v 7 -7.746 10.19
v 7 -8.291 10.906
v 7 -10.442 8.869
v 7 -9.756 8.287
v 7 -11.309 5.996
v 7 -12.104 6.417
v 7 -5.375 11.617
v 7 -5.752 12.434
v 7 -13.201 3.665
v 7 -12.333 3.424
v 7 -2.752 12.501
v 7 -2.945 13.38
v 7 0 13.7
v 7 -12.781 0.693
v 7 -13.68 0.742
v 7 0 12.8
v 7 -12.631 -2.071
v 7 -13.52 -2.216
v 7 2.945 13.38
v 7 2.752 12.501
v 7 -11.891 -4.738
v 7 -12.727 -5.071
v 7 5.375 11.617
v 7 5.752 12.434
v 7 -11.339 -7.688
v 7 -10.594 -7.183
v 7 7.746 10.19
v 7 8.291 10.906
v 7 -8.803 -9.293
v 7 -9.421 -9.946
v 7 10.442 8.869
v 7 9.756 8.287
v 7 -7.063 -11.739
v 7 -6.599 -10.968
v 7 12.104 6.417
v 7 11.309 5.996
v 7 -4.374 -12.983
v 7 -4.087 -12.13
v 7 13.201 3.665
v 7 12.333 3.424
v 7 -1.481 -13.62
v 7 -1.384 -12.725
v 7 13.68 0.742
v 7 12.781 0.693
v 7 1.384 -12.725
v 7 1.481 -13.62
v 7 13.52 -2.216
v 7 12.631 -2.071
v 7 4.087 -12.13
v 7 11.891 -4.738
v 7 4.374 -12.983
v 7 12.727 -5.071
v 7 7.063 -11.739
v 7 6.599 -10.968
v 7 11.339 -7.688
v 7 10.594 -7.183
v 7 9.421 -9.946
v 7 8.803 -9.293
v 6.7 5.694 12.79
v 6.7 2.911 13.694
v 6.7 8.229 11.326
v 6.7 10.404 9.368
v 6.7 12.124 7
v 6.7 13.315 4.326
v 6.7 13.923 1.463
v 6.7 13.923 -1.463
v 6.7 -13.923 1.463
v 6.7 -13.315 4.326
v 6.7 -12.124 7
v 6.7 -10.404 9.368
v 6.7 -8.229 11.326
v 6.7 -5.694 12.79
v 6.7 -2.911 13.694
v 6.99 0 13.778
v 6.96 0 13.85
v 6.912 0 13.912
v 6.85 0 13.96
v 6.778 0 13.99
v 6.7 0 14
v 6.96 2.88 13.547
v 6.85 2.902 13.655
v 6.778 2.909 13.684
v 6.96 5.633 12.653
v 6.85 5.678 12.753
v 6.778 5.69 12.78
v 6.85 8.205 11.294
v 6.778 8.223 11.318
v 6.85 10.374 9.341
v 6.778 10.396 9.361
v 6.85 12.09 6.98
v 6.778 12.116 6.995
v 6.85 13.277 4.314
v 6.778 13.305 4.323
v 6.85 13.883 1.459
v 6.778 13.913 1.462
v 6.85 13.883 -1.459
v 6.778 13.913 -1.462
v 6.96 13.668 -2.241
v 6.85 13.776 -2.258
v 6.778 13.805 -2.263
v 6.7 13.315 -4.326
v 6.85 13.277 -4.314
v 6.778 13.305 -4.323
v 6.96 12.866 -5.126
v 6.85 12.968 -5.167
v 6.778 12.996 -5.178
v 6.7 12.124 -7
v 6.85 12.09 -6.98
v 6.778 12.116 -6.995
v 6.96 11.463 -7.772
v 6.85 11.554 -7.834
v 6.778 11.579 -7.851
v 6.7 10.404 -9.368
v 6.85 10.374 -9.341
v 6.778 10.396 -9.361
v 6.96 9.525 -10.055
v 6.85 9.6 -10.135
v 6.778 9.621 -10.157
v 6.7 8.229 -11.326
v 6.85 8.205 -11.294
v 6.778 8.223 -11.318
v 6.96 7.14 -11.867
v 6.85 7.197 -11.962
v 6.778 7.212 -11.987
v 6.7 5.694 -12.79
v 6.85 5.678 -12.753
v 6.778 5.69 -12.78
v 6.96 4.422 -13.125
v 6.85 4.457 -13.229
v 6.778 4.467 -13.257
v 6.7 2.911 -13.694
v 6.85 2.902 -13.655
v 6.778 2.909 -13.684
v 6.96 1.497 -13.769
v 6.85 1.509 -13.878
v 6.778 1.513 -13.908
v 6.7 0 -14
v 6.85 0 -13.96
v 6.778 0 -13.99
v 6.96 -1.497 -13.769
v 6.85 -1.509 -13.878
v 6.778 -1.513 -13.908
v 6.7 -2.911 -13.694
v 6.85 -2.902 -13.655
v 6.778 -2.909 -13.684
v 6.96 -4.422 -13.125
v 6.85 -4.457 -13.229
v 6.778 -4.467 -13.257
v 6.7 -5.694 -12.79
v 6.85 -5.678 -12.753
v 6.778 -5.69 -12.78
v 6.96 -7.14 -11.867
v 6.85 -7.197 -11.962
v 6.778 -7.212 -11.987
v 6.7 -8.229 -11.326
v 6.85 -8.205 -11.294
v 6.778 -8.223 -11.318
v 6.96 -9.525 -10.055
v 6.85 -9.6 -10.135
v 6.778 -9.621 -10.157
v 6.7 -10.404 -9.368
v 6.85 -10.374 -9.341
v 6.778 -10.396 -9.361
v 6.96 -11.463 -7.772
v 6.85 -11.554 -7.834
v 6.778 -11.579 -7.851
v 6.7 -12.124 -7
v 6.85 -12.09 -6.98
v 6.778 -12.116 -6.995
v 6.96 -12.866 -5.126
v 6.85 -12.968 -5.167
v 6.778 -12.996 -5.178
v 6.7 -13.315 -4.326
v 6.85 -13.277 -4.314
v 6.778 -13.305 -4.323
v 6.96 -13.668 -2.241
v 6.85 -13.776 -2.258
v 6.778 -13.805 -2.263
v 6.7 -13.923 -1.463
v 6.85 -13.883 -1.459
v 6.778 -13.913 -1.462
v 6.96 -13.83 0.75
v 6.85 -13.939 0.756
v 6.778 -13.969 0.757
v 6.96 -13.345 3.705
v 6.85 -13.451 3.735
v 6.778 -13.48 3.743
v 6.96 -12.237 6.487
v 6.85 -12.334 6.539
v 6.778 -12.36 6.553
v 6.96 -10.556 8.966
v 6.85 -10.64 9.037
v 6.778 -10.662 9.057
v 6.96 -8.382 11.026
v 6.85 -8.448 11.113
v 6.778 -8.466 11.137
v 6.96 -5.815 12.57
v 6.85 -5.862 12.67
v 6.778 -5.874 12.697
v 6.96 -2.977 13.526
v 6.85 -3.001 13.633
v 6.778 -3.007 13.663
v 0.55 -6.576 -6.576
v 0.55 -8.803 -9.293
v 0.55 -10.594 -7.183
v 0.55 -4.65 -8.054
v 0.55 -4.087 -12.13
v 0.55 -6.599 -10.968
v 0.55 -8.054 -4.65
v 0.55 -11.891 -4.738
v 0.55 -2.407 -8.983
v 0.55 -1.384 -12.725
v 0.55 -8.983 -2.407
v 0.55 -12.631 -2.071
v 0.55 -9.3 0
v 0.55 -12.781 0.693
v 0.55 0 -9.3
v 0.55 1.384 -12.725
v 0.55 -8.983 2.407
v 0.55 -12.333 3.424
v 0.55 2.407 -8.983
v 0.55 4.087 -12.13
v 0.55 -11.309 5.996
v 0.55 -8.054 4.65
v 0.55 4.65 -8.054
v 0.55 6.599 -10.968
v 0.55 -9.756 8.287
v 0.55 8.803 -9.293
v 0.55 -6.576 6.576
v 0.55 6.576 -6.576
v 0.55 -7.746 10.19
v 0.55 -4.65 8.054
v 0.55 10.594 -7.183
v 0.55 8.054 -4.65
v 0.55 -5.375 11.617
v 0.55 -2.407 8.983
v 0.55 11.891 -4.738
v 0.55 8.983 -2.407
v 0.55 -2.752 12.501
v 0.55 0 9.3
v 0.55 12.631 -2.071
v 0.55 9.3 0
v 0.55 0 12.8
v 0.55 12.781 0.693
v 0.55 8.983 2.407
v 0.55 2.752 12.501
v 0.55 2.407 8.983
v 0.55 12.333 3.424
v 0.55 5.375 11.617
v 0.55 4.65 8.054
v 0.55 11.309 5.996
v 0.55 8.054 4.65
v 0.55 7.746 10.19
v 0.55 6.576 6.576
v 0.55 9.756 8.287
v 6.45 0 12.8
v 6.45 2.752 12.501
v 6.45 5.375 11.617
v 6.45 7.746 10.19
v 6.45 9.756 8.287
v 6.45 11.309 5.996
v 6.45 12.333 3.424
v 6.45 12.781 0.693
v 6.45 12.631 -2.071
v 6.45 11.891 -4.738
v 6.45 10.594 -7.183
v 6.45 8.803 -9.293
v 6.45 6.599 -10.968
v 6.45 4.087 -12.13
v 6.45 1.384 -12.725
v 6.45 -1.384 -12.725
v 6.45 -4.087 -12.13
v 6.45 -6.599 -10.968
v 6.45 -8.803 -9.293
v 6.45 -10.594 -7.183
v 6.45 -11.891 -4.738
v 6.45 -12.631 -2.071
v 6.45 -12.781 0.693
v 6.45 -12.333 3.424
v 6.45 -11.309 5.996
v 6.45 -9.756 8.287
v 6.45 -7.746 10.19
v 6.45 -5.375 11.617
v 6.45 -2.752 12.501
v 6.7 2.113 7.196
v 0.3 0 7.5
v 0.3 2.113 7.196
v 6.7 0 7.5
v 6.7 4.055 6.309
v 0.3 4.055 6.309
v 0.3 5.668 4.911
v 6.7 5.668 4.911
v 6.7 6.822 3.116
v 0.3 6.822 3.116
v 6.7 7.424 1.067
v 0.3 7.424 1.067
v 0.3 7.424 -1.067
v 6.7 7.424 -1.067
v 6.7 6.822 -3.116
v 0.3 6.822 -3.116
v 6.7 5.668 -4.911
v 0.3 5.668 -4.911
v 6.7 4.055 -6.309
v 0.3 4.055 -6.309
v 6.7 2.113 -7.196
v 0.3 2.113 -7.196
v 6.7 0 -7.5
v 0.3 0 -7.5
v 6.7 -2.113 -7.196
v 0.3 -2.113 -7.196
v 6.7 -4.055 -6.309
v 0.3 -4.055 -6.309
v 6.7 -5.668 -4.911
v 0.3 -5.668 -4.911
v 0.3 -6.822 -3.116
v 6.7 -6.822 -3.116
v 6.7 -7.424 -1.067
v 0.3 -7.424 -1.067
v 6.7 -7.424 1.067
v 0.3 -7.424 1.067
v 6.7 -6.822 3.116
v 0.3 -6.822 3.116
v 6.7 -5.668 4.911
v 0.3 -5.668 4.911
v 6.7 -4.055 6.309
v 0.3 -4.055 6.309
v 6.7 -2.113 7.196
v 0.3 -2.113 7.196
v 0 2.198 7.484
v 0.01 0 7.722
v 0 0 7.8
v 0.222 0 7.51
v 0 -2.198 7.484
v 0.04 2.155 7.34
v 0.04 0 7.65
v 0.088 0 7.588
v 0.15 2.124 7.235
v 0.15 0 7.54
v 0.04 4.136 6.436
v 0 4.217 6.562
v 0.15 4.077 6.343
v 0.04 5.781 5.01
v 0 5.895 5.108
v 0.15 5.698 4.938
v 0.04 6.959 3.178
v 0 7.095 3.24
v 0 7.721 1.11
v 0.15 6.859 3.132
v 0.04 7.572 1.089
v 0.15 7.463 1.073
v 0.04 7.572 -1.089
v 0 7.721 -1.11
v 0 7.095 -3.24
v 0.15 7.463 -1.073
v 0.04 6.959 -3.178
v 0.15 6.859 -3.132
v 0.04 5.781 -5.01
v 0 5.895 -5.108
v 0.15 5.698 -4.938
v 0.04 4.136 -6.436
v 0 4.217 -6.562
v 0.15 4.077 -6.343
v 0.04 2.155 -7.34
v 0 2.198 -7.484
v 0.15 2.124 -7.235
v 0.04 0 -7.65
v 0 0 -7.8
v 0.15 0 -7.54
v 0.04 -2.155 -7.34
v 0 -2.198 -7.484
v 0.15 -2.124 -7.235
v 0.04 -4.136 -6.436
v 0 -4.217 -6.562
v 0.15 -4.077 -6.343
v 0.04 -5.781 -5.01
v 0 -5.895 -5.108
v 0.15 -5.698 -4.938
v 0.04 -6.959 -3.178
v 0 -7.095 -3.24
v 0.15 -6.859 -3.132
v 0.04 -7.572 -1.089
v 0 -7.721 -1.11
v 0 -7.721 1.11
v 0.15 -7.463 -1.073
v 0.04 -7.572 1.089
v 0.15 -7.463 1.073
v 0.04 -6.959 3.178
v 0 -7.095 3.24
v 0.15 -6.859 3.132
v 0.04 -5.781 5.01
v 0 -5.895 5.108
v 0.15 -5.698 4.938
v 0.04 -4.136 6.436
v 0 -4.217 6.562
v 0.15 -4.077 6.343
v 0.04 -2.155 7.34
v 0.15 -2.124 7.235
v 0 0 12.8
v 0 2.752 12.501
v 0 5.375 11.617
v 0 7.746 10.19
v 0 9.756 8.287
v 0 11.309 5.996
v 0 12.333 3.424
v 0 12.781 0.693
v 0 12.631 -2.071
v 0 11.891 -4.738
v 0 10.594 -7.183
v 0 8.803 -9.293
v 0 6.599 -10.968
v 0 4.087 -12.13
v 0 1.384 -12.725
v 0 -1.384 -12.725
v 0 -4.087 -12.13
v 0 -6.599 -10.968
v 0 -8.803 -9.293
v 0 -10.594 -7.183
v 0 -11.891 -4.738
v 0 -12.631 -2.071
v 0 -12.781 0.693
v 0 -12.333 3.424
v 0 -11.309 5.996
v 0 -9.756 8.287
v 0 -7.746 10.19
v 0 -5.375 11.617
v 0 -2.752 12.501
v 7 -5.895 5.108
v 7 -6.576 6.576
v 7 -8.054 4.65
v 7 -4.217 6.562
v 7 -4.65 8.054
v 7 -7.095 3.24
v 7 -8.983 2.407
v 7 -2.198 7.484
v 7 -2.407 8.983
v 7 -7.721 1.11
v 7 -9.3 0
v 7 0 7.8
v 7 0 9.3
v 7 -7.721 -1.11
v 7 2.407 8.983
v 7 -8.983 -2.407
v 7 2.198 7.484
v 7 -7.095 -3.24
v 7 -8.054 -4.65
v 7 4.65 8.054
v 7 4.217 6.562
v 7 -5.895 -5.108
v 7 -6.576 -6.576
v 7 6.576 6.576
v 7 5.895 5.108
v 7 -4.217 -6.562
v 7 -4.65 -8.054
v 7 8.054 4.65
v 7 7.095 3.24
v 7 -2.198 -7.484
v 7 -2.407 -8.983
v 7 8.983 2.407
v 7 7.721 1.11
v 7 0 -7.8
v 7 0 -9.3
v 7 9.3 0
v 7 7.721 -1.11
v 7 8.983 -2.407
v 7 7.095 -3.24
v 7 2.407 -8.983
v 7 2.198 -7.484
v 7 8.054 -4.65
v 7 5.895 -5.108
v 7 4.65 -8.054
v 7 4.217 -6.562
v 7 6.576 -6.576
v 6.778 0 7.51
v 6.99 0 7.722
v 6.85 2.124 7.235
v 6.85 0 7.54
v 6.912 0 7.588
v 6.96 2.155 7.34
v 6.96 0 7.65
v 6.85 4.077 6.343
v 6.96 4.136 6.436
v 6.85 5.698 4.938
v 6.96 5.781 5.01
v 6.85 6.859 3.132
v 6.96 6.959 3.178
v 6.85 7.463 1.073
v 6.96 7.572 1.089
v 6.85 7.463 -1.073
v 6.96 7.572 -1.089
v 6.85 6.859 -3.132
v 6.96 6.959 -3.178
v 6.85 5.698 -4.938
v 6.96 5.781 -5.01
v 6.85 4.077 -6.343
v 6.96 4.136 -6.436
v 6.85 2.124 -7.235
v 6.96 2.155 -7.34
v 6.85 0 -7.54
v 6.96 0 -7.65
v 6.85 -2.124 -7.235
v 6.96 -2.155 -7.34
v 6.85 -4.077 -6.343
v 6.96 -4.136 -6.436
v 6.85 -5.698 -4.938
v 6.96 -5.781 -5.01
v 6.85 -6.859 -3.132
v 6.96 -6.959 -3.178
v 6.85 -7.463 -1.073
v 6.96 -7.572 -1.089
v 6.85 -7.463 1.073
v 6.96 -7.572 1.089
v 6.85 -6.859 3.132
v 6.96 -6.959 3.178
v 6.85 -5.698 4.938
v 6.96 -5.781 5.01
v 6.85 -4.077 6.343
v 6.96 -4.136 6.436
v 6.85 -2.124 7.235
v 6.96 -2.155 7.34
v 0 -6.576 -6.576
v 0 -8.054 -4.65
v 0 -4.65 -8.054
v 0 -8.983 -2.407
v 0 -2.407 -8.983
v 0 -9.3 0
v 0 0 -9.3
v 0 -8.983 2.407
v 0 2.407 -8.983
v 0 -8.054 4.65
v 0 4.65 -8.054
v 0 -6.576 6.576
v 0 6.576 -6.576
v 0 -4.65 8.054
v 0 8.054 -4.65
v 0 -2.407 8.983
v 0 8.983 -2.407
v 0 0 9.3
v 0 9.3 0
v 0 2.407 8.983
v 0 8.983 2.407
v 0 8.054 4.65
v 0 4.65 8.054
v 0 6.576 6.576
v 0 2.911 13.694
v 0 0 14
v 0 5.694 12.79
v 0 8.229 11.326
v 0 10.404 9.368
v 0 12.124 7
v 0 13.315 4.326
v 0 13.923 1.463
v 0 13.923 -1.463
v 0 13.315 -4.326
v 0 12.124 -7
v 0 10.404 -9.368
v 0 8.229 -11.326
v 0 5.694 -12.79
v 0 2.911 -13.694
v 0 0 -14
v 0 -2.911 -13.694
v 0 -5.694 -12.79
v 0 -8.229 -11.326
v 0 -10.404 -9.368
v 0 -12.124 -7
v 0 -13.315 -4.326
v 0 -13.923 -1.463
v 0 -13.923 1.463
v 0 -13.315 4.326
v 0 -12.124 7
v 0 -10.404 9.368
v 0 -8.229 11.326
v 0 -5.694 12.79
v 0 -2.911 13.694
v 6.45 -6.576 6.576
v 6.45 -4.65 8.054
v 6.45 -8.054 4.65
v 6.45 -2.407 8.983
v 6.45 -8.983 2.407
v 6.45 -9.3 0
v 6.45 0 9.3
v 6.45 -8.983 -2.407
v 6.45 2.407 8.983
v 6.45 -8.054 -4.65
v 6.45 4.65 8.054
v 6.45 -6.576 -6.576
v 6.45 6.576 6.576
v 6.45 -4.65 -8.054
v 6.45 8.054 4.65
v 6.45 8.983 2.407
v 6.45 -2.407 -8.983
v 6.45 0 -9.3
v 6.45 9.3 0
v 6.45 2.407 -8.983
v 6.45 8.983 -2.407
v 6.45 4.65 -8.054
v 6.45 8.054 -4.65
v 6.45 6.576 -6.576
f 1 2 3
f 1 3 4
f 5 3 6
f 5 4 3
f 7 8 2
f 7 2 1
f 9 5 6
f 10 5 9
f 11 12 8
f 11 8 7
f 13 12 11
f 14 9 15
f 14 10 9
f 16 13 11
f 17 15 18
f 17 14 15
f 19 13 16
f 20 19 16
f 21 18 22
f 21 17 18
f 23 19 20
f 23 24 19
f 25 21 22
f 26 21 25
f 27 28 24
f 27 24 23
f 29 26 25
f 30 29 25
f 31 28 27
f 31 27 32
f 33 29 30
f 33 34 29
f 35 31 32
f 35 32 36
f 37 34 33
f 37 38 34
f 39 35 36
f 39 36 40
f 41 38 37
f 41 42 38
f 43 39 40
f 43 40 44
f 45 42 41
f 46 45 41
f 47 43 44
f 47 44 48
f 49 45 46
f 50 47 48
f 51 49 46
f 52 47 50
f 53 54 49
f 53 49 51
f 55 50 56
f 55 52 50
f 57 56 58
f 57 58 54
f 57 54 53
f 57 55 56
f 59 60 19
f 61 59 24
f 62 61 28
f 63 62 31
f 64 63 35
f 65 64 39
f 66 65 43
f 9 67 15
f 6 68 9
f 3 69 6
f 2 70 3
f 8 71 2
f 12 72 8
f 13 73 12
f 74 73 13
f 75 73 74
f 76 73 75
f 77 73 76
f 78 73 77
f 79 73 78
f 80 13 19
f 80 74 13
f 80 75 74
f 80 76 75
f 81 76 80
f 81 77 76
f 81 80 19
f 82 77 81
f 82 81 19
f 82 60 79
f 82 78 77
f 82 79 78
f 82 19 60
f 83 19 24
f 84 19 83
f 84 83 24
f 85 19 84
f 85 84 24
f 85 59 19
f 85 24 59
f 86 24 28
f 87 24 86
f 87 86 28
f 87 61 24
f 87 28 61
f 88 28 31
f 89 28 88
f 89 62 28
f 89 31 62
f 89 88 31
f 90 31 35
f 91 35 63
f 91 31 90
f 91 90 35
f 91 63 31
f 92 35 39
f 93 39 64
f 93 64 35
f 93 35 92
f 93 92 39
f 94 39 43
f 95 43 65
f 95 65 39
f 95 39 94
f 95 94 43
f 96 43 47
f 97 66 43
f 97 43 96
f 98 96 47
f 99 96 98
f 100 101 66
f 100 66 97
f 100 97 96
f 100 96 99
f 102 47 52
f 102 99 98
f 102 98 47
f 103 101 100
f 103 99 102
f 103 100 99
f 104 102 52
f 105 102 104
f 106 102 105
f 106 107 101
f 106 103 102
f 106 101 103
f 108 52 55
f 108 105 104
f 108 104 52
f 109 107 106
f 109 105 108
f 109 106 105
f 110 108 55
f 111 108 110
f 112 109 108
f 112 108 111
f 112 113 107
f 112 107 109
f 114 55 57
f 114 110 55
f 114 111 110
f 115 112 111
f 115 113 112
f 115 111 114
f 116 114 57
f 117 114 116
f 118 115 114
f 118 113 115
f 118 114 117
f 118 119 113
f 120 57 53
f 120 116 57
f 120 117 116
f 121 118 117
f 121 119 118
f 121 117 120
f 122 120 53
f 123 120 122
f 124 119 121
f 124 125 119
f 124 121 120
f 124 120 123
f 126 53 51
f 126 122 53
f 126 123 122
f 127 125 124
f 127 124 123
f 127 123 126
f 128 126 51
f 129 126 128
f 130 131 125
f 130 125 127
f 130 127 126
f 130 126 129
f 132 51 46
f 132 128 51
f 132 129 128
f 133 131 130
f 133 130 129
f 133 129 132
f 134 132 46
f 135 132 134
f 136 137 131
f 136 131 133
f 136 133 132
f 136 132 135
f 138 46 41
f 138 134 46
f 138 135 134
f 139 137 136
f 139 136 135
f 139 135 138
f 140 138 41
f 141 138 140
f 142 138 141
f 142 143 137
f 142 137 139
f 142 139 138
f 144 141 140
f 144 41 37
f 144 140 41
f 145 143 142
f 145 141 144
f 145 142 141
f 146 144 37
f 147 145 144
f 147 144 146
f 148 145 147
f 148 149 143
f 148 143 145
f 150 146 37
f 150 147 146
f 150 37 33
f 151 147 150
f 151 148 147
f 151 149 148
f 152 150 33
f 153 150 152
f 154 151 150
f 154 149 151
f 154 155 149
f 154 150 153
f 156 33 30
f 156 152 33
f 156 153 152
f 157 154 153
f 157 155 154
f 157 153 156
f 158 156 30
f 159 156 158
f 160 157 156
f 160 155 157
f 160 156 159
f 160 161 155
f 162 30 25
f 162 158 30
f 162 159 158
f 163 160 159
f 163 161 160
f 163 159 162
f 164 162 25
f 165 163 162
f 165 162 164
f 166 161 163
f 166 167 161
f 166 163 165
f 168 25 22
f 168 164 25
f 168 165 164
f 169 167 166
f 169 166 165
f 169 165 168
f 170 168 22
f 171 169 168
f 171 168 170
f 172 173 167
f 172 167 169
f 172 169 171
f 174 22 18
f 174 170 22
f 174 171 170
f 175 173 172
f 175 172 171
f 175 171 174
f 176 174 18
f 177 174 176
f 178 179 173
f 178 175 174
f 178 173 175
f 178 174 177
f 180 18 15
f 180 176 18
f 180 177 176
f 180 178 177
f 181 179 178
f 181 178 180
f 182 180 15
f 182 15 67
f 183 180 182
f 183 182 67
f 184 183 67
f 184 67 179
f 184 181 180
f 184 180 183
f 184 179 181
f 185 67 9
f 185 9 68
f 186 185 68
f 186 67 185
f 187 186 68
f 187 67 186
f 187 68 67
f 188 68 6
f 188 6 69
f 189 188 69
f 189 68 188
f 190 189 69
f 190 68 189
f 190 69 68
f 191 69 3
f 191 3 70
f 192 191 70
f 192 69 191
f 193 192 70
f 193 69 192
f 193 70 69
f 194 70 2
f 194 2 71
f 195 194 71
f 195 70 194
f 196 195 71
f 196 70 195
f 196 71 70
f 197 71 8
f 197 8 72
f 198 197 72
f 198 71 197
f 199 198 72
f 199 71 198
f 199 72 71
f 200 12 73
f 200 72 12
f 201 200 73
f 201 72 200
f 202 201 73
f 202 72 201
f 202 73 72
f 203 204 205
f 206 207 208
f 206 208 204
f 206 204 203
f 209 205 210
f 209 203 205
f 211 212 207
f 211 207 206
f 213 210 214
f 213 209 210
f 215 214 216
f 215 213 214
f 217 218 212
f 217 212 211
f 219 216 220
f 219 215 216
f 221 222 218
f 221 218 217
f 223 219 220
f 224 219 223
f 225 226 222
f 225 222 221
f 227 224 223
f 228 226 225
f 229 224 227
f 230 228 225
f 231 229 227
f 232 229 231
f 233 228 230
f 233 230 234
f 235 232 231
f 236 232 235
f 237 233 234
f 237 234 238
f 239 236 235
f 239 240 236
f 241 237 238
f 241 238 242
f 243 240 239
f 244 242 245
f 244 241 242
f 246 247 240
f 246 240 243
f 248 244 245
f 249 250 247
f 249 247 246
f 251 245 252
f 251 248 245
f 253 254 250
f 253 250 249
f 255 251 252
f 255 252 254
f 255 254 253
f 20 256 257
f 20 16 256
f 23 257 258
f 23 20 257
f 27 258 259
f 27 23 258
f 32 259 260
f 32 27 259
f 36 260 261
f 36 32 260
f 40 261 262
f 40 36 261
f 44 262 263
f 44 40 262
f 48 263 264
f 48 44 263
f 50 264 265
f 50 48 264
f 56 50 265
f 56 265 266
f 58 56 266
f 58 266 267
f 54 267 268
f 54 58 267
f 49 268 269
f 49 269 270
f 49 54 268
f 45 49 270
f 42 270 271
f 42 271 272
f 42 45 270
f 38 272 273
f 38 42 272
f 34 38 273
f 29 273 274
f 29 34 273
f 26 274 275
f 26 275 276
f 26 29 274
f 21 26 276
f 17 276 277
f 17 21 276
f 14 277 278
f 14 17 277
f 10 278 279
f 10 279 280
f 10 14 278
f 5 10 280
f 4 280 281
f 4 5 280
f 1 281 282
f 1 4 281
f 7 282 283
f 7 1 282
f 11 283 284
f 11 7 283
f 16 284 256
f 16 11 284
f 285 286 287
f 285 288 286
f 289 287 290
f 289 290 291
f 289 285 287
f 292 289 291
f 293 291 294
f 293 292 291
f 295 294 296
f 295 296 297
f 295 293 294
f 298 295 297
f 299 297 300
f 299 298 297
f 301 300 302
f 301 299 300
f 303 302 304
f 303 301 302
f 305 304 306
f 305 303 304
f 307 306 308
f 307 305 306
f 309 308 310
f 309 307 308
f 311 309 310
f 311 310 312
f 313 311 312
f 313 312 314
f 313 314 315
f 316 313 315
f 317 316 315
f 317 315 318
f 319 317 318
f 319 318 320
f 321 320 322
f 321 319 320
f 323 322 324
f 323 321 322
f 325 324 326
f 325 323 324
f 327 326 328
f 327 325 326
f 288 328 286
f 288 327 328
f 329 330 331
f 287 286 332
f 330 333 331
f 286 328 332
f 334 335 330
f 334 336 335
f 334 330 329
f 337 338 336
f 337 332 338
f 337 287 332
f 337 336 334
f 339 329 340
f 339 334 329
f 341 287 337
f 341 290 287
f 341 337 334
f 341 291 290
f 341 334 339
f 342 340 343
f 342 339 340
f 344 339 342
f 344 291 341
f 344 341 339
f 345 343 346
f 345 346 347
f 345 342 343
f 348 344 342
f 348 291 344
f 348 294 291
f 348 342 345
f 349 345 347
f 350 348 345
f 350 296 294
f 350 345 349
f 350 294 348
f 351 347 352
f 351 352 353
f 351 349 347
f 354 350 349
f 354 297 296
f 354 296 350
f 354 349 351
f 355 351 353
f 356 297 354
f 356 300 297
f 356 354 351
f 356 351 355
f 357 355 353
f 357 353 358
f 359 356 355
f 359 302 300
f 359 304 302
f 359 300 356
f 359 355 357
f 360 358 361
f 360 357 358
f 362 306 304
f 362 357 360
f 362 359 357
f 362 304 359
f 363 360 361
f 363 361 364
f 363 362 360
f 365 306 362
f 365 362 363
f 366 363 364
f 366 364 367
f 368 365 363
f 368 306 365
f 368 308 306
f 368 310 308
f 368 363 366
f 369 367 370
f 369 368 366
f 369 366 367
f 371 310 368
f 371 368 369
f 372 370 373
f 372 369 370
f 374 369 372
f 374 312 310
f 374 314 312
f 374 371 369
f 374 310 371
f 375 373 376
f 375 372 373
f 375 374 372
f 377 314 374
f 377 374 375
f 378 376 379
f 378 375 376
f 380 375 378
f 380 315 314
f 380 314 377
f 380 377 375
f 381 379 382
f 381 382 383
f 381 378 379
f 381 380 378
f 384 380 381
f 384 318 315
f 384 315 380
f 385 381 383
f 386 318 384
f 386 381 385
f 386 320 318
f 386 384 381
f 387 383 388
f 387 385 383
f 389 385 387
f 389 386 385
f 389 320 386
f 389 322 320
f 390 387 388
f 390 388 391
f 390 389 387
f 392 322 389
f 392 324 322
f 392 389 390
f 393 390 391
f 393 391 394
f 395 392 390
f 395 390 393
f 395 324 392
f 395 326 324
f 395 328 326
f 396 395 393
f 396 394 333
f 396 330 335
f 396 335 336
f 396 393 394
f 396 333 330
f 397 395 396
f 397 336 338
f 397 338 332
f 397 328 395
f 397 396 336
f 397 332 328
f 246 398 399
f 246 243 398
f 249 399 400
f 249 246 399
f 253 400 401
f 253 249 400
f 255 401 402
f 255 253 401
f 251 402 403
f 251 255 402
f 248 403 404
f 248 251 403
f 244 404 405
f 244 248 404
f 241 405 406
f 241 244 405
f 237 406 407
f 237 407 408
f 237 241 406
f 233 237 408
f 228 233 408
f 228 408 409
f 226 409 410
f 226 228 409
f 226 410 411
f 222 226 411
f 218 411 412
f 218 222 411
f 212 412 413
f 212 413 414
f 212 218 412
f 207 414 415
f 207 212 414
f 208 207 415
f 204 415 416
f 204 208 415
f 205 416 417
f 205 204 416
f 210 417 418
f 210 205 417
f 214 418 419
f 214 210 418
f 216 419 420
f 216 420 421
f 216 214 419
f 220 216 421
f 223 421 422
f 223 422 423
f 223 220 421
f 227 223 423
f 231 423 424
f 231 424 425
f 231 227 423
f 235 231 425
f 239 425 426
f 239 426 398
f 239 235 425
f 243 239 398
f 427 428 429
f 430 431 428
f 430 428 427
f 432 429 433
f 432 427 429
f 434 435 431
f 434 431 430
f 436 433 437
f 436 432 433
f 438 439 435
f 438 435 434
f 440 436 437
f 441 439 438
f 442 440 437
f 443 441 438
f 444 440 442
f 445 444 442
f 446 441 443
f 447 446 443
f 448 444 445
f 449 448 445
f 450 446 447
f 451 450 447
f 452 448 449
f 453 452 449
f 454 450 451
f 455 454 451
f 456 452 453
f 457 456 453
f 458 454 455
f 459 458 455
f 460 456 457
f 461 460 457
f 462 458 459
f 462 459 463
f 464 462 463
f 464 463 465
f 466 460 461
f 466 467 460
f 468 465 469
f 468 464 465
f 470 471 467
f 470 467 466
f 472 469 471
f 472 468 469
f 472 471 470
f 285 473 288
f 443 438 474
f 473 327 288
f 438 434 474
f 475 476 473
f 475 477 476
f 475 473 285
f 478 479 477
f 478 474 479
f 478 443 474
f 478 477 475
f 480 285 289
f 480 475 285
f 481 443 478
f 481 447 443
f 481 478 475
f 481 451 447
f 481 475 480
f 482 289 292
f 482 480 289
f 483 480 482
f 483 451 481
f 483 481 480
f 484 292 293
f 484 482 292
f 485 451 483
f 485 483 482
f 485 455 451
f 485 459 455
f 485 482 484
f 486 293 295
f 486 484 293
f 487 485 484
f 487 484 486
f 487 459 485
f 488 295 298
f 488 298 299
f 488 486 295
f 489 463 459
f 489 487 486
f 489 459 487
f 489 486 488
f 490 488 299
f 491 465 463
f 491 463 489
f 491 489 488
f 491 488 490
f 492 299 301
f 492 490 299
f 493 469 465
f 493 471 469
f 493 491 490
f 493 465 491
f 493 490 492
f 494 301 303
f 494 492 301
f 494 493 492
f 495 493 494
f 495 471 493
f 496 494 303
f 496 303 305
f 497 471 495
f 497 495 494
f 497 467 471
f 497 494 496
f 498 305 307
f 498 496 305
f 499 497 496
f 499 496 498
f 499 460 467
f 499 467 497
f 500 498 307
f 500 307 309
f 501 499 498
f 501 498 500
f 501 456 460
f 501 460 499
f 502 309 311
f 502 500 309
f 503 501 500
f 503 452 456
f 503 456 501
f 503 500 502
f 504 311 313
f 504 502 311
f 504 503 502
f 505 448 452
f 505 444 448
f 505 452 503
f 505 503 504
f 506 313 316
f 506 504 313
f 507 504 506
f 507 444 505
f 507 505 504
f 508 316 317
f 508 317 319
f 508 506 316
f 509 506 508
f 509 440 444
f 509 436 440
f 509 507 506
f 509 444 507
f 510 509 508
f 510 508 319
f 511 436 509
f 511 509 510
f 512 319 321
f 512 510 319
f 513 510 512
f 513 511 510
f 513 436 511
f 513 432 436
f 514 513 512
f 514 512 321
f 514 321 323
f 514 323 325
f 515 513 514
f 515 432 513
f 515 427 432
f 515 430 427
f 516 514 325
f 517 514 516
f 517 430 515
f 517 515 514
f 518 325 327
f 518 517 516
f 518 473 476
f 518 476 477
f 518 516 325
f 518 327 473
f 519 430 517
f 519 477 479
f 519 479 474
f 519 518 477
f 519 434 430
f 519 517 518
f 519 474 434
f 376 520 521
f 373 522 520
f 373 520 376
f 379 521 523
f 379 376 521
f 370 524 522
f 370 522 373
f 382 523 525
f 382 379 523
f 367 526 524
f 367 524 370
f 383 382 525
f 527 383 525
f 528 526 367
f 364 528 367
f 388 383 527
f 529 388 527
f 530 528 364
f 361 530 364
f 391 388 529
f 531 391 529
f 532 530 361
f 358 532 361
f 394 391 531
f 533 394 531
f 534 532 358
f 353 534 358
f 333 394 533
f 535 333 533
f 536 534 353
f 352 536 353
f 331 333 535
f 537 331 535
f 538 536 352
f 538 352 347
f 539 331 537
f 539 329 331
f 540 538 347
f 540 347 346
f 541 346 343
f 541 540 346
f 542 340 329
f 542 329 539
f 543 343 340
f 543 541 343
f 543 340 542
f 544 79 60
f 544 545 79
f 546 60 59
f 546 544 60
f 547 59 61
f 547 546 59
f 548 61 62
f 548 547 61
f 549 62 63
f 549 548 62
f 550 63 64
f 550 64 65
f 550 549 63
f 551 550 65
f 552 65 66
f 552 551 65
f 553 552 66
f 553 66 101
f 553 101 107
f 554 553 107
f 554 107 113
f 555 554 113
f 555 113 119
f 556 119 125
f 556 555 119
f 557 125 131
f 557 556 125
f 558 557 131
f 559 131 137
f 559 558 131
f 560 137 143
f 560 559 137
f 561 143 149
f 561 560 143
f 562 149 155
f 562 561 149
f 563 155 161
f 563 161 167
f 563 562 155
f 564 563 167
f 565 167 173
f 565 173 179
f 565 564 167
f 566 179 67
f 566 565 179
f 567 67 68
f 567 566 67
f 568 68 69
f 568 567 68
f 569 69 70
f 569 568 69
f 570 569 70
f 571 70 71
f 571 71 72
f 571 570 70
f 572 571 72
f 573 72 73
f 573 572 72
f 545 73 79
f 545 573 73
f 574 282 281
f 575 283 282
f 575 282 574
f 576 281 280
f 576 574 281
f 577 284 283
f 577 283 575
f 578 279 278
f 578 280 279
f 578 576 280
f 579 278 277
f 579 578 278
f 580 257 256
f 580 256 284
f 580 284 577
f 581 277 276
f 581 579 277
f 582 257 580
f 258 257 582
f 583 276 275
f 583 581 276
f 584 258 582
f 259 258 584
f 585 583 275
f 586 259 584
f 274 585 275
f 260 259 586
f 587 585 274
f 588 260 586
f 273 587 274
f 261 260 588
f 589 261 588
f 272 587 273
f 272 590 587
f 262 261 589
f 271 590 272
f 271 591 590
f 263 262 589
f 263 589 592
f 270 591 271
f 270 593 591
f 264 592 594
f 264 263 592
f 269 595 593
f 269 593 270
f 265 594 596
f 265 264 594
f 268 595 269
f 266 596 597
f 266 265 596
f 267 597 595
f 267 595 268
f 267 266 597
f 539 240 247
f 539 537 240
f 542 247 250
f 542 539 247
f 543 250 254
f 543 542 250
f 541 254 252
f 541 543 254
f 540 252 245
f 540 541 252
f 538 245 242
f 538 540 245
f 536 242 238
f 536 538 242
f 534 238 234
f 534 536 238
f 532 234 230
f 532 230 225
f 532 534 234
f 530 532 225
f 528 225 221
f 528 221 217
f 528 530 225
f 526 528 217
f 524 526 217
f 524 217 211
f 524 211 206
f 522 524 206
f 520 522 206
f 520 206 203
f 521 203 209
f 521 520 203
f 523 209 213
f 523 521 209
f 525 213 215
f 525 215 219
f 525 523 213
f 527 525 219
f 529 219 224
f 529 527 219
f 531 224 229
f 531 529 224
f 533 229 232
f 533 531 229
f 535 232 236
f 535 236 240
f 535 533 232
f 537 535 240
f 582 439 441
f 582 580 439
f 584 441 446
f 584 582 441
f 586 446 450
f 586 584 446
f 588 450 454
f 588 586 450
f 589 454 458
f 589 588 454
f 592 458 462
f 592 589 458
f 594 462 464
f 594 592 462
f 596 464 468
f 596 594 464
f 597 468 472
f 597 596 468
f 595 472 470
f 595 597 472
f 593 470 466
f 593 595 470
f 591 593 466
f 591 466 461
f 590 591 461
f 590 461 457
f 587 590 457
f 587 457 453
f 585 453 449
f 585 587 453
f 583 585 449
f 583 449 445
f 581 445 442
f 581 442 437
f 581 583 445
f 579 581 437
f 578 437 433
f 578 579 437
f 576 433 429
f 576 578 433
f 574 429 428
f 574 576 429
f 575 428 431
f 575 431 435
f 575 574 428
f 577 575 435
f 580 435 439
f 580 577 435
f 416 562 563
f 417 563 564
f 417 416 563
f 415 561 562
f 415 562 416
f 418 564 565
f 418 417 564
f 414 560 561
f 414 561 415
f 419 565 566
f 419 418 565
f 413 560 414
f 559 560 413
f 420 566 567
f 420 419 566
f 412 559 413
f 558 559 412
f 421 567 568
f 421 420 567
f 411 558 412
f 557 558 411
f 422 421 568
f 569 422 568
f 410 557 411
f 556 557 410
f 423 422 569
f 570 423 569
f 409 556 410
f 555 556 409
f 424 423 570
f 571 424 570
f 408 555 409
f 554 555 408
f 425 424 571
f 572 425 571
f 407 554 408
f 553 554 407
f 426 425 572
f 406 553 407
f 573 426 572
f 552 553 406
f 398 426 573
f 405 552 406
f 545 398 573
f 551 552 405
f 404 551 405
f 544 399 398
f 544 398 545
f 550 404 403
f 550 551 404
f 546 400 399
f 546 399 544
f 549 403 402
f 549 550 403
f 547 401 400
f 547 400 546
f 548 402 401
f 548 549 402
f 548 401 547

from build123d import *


with BuildPart() as part:
    # 草图1 → 旋转1 (revolve)
    with BuildSketch(Plane.XY):
        with BuildLine():
            Line((0, 14), (0, 12.8))
            Line((0, 12.8), (0.55, 12.8))
            Line((0.55, 12.8), (0.55, 9.3))
            Line((0.55, 9.3), (0, 9.3))
            Line((0, 9.3), (0, 7.8))
            ThreePointArc((0, 7.8), (0.087867966, 7.587867966), (0.3, 7.5))
            Line((0.3, 7.5), (6.7, 7.5))
            ThreePointArc((6.7, 7.5), (6.912132034, 7.587867966), (7, 7.8))
            Line((7, 7.8), (7, 9.3))
            Line((7, 9.3), (6.45, 9.3))
            Line((6.45, 9.3), (6.45, 12.8))
            Line((6.45, 12.8), (7, 12.8))
            Line((7, 12.8), (7, 13.7))
            ThreePointArc((7, 13.7), (6.912132034, 13.912132034), (6.7, 14))
            Line((6.7, 14), (0, 14))
        make_face()
    revolve(axis=Axis((7, 0, 0), (-1, 0, 0)))


solid = part.part
